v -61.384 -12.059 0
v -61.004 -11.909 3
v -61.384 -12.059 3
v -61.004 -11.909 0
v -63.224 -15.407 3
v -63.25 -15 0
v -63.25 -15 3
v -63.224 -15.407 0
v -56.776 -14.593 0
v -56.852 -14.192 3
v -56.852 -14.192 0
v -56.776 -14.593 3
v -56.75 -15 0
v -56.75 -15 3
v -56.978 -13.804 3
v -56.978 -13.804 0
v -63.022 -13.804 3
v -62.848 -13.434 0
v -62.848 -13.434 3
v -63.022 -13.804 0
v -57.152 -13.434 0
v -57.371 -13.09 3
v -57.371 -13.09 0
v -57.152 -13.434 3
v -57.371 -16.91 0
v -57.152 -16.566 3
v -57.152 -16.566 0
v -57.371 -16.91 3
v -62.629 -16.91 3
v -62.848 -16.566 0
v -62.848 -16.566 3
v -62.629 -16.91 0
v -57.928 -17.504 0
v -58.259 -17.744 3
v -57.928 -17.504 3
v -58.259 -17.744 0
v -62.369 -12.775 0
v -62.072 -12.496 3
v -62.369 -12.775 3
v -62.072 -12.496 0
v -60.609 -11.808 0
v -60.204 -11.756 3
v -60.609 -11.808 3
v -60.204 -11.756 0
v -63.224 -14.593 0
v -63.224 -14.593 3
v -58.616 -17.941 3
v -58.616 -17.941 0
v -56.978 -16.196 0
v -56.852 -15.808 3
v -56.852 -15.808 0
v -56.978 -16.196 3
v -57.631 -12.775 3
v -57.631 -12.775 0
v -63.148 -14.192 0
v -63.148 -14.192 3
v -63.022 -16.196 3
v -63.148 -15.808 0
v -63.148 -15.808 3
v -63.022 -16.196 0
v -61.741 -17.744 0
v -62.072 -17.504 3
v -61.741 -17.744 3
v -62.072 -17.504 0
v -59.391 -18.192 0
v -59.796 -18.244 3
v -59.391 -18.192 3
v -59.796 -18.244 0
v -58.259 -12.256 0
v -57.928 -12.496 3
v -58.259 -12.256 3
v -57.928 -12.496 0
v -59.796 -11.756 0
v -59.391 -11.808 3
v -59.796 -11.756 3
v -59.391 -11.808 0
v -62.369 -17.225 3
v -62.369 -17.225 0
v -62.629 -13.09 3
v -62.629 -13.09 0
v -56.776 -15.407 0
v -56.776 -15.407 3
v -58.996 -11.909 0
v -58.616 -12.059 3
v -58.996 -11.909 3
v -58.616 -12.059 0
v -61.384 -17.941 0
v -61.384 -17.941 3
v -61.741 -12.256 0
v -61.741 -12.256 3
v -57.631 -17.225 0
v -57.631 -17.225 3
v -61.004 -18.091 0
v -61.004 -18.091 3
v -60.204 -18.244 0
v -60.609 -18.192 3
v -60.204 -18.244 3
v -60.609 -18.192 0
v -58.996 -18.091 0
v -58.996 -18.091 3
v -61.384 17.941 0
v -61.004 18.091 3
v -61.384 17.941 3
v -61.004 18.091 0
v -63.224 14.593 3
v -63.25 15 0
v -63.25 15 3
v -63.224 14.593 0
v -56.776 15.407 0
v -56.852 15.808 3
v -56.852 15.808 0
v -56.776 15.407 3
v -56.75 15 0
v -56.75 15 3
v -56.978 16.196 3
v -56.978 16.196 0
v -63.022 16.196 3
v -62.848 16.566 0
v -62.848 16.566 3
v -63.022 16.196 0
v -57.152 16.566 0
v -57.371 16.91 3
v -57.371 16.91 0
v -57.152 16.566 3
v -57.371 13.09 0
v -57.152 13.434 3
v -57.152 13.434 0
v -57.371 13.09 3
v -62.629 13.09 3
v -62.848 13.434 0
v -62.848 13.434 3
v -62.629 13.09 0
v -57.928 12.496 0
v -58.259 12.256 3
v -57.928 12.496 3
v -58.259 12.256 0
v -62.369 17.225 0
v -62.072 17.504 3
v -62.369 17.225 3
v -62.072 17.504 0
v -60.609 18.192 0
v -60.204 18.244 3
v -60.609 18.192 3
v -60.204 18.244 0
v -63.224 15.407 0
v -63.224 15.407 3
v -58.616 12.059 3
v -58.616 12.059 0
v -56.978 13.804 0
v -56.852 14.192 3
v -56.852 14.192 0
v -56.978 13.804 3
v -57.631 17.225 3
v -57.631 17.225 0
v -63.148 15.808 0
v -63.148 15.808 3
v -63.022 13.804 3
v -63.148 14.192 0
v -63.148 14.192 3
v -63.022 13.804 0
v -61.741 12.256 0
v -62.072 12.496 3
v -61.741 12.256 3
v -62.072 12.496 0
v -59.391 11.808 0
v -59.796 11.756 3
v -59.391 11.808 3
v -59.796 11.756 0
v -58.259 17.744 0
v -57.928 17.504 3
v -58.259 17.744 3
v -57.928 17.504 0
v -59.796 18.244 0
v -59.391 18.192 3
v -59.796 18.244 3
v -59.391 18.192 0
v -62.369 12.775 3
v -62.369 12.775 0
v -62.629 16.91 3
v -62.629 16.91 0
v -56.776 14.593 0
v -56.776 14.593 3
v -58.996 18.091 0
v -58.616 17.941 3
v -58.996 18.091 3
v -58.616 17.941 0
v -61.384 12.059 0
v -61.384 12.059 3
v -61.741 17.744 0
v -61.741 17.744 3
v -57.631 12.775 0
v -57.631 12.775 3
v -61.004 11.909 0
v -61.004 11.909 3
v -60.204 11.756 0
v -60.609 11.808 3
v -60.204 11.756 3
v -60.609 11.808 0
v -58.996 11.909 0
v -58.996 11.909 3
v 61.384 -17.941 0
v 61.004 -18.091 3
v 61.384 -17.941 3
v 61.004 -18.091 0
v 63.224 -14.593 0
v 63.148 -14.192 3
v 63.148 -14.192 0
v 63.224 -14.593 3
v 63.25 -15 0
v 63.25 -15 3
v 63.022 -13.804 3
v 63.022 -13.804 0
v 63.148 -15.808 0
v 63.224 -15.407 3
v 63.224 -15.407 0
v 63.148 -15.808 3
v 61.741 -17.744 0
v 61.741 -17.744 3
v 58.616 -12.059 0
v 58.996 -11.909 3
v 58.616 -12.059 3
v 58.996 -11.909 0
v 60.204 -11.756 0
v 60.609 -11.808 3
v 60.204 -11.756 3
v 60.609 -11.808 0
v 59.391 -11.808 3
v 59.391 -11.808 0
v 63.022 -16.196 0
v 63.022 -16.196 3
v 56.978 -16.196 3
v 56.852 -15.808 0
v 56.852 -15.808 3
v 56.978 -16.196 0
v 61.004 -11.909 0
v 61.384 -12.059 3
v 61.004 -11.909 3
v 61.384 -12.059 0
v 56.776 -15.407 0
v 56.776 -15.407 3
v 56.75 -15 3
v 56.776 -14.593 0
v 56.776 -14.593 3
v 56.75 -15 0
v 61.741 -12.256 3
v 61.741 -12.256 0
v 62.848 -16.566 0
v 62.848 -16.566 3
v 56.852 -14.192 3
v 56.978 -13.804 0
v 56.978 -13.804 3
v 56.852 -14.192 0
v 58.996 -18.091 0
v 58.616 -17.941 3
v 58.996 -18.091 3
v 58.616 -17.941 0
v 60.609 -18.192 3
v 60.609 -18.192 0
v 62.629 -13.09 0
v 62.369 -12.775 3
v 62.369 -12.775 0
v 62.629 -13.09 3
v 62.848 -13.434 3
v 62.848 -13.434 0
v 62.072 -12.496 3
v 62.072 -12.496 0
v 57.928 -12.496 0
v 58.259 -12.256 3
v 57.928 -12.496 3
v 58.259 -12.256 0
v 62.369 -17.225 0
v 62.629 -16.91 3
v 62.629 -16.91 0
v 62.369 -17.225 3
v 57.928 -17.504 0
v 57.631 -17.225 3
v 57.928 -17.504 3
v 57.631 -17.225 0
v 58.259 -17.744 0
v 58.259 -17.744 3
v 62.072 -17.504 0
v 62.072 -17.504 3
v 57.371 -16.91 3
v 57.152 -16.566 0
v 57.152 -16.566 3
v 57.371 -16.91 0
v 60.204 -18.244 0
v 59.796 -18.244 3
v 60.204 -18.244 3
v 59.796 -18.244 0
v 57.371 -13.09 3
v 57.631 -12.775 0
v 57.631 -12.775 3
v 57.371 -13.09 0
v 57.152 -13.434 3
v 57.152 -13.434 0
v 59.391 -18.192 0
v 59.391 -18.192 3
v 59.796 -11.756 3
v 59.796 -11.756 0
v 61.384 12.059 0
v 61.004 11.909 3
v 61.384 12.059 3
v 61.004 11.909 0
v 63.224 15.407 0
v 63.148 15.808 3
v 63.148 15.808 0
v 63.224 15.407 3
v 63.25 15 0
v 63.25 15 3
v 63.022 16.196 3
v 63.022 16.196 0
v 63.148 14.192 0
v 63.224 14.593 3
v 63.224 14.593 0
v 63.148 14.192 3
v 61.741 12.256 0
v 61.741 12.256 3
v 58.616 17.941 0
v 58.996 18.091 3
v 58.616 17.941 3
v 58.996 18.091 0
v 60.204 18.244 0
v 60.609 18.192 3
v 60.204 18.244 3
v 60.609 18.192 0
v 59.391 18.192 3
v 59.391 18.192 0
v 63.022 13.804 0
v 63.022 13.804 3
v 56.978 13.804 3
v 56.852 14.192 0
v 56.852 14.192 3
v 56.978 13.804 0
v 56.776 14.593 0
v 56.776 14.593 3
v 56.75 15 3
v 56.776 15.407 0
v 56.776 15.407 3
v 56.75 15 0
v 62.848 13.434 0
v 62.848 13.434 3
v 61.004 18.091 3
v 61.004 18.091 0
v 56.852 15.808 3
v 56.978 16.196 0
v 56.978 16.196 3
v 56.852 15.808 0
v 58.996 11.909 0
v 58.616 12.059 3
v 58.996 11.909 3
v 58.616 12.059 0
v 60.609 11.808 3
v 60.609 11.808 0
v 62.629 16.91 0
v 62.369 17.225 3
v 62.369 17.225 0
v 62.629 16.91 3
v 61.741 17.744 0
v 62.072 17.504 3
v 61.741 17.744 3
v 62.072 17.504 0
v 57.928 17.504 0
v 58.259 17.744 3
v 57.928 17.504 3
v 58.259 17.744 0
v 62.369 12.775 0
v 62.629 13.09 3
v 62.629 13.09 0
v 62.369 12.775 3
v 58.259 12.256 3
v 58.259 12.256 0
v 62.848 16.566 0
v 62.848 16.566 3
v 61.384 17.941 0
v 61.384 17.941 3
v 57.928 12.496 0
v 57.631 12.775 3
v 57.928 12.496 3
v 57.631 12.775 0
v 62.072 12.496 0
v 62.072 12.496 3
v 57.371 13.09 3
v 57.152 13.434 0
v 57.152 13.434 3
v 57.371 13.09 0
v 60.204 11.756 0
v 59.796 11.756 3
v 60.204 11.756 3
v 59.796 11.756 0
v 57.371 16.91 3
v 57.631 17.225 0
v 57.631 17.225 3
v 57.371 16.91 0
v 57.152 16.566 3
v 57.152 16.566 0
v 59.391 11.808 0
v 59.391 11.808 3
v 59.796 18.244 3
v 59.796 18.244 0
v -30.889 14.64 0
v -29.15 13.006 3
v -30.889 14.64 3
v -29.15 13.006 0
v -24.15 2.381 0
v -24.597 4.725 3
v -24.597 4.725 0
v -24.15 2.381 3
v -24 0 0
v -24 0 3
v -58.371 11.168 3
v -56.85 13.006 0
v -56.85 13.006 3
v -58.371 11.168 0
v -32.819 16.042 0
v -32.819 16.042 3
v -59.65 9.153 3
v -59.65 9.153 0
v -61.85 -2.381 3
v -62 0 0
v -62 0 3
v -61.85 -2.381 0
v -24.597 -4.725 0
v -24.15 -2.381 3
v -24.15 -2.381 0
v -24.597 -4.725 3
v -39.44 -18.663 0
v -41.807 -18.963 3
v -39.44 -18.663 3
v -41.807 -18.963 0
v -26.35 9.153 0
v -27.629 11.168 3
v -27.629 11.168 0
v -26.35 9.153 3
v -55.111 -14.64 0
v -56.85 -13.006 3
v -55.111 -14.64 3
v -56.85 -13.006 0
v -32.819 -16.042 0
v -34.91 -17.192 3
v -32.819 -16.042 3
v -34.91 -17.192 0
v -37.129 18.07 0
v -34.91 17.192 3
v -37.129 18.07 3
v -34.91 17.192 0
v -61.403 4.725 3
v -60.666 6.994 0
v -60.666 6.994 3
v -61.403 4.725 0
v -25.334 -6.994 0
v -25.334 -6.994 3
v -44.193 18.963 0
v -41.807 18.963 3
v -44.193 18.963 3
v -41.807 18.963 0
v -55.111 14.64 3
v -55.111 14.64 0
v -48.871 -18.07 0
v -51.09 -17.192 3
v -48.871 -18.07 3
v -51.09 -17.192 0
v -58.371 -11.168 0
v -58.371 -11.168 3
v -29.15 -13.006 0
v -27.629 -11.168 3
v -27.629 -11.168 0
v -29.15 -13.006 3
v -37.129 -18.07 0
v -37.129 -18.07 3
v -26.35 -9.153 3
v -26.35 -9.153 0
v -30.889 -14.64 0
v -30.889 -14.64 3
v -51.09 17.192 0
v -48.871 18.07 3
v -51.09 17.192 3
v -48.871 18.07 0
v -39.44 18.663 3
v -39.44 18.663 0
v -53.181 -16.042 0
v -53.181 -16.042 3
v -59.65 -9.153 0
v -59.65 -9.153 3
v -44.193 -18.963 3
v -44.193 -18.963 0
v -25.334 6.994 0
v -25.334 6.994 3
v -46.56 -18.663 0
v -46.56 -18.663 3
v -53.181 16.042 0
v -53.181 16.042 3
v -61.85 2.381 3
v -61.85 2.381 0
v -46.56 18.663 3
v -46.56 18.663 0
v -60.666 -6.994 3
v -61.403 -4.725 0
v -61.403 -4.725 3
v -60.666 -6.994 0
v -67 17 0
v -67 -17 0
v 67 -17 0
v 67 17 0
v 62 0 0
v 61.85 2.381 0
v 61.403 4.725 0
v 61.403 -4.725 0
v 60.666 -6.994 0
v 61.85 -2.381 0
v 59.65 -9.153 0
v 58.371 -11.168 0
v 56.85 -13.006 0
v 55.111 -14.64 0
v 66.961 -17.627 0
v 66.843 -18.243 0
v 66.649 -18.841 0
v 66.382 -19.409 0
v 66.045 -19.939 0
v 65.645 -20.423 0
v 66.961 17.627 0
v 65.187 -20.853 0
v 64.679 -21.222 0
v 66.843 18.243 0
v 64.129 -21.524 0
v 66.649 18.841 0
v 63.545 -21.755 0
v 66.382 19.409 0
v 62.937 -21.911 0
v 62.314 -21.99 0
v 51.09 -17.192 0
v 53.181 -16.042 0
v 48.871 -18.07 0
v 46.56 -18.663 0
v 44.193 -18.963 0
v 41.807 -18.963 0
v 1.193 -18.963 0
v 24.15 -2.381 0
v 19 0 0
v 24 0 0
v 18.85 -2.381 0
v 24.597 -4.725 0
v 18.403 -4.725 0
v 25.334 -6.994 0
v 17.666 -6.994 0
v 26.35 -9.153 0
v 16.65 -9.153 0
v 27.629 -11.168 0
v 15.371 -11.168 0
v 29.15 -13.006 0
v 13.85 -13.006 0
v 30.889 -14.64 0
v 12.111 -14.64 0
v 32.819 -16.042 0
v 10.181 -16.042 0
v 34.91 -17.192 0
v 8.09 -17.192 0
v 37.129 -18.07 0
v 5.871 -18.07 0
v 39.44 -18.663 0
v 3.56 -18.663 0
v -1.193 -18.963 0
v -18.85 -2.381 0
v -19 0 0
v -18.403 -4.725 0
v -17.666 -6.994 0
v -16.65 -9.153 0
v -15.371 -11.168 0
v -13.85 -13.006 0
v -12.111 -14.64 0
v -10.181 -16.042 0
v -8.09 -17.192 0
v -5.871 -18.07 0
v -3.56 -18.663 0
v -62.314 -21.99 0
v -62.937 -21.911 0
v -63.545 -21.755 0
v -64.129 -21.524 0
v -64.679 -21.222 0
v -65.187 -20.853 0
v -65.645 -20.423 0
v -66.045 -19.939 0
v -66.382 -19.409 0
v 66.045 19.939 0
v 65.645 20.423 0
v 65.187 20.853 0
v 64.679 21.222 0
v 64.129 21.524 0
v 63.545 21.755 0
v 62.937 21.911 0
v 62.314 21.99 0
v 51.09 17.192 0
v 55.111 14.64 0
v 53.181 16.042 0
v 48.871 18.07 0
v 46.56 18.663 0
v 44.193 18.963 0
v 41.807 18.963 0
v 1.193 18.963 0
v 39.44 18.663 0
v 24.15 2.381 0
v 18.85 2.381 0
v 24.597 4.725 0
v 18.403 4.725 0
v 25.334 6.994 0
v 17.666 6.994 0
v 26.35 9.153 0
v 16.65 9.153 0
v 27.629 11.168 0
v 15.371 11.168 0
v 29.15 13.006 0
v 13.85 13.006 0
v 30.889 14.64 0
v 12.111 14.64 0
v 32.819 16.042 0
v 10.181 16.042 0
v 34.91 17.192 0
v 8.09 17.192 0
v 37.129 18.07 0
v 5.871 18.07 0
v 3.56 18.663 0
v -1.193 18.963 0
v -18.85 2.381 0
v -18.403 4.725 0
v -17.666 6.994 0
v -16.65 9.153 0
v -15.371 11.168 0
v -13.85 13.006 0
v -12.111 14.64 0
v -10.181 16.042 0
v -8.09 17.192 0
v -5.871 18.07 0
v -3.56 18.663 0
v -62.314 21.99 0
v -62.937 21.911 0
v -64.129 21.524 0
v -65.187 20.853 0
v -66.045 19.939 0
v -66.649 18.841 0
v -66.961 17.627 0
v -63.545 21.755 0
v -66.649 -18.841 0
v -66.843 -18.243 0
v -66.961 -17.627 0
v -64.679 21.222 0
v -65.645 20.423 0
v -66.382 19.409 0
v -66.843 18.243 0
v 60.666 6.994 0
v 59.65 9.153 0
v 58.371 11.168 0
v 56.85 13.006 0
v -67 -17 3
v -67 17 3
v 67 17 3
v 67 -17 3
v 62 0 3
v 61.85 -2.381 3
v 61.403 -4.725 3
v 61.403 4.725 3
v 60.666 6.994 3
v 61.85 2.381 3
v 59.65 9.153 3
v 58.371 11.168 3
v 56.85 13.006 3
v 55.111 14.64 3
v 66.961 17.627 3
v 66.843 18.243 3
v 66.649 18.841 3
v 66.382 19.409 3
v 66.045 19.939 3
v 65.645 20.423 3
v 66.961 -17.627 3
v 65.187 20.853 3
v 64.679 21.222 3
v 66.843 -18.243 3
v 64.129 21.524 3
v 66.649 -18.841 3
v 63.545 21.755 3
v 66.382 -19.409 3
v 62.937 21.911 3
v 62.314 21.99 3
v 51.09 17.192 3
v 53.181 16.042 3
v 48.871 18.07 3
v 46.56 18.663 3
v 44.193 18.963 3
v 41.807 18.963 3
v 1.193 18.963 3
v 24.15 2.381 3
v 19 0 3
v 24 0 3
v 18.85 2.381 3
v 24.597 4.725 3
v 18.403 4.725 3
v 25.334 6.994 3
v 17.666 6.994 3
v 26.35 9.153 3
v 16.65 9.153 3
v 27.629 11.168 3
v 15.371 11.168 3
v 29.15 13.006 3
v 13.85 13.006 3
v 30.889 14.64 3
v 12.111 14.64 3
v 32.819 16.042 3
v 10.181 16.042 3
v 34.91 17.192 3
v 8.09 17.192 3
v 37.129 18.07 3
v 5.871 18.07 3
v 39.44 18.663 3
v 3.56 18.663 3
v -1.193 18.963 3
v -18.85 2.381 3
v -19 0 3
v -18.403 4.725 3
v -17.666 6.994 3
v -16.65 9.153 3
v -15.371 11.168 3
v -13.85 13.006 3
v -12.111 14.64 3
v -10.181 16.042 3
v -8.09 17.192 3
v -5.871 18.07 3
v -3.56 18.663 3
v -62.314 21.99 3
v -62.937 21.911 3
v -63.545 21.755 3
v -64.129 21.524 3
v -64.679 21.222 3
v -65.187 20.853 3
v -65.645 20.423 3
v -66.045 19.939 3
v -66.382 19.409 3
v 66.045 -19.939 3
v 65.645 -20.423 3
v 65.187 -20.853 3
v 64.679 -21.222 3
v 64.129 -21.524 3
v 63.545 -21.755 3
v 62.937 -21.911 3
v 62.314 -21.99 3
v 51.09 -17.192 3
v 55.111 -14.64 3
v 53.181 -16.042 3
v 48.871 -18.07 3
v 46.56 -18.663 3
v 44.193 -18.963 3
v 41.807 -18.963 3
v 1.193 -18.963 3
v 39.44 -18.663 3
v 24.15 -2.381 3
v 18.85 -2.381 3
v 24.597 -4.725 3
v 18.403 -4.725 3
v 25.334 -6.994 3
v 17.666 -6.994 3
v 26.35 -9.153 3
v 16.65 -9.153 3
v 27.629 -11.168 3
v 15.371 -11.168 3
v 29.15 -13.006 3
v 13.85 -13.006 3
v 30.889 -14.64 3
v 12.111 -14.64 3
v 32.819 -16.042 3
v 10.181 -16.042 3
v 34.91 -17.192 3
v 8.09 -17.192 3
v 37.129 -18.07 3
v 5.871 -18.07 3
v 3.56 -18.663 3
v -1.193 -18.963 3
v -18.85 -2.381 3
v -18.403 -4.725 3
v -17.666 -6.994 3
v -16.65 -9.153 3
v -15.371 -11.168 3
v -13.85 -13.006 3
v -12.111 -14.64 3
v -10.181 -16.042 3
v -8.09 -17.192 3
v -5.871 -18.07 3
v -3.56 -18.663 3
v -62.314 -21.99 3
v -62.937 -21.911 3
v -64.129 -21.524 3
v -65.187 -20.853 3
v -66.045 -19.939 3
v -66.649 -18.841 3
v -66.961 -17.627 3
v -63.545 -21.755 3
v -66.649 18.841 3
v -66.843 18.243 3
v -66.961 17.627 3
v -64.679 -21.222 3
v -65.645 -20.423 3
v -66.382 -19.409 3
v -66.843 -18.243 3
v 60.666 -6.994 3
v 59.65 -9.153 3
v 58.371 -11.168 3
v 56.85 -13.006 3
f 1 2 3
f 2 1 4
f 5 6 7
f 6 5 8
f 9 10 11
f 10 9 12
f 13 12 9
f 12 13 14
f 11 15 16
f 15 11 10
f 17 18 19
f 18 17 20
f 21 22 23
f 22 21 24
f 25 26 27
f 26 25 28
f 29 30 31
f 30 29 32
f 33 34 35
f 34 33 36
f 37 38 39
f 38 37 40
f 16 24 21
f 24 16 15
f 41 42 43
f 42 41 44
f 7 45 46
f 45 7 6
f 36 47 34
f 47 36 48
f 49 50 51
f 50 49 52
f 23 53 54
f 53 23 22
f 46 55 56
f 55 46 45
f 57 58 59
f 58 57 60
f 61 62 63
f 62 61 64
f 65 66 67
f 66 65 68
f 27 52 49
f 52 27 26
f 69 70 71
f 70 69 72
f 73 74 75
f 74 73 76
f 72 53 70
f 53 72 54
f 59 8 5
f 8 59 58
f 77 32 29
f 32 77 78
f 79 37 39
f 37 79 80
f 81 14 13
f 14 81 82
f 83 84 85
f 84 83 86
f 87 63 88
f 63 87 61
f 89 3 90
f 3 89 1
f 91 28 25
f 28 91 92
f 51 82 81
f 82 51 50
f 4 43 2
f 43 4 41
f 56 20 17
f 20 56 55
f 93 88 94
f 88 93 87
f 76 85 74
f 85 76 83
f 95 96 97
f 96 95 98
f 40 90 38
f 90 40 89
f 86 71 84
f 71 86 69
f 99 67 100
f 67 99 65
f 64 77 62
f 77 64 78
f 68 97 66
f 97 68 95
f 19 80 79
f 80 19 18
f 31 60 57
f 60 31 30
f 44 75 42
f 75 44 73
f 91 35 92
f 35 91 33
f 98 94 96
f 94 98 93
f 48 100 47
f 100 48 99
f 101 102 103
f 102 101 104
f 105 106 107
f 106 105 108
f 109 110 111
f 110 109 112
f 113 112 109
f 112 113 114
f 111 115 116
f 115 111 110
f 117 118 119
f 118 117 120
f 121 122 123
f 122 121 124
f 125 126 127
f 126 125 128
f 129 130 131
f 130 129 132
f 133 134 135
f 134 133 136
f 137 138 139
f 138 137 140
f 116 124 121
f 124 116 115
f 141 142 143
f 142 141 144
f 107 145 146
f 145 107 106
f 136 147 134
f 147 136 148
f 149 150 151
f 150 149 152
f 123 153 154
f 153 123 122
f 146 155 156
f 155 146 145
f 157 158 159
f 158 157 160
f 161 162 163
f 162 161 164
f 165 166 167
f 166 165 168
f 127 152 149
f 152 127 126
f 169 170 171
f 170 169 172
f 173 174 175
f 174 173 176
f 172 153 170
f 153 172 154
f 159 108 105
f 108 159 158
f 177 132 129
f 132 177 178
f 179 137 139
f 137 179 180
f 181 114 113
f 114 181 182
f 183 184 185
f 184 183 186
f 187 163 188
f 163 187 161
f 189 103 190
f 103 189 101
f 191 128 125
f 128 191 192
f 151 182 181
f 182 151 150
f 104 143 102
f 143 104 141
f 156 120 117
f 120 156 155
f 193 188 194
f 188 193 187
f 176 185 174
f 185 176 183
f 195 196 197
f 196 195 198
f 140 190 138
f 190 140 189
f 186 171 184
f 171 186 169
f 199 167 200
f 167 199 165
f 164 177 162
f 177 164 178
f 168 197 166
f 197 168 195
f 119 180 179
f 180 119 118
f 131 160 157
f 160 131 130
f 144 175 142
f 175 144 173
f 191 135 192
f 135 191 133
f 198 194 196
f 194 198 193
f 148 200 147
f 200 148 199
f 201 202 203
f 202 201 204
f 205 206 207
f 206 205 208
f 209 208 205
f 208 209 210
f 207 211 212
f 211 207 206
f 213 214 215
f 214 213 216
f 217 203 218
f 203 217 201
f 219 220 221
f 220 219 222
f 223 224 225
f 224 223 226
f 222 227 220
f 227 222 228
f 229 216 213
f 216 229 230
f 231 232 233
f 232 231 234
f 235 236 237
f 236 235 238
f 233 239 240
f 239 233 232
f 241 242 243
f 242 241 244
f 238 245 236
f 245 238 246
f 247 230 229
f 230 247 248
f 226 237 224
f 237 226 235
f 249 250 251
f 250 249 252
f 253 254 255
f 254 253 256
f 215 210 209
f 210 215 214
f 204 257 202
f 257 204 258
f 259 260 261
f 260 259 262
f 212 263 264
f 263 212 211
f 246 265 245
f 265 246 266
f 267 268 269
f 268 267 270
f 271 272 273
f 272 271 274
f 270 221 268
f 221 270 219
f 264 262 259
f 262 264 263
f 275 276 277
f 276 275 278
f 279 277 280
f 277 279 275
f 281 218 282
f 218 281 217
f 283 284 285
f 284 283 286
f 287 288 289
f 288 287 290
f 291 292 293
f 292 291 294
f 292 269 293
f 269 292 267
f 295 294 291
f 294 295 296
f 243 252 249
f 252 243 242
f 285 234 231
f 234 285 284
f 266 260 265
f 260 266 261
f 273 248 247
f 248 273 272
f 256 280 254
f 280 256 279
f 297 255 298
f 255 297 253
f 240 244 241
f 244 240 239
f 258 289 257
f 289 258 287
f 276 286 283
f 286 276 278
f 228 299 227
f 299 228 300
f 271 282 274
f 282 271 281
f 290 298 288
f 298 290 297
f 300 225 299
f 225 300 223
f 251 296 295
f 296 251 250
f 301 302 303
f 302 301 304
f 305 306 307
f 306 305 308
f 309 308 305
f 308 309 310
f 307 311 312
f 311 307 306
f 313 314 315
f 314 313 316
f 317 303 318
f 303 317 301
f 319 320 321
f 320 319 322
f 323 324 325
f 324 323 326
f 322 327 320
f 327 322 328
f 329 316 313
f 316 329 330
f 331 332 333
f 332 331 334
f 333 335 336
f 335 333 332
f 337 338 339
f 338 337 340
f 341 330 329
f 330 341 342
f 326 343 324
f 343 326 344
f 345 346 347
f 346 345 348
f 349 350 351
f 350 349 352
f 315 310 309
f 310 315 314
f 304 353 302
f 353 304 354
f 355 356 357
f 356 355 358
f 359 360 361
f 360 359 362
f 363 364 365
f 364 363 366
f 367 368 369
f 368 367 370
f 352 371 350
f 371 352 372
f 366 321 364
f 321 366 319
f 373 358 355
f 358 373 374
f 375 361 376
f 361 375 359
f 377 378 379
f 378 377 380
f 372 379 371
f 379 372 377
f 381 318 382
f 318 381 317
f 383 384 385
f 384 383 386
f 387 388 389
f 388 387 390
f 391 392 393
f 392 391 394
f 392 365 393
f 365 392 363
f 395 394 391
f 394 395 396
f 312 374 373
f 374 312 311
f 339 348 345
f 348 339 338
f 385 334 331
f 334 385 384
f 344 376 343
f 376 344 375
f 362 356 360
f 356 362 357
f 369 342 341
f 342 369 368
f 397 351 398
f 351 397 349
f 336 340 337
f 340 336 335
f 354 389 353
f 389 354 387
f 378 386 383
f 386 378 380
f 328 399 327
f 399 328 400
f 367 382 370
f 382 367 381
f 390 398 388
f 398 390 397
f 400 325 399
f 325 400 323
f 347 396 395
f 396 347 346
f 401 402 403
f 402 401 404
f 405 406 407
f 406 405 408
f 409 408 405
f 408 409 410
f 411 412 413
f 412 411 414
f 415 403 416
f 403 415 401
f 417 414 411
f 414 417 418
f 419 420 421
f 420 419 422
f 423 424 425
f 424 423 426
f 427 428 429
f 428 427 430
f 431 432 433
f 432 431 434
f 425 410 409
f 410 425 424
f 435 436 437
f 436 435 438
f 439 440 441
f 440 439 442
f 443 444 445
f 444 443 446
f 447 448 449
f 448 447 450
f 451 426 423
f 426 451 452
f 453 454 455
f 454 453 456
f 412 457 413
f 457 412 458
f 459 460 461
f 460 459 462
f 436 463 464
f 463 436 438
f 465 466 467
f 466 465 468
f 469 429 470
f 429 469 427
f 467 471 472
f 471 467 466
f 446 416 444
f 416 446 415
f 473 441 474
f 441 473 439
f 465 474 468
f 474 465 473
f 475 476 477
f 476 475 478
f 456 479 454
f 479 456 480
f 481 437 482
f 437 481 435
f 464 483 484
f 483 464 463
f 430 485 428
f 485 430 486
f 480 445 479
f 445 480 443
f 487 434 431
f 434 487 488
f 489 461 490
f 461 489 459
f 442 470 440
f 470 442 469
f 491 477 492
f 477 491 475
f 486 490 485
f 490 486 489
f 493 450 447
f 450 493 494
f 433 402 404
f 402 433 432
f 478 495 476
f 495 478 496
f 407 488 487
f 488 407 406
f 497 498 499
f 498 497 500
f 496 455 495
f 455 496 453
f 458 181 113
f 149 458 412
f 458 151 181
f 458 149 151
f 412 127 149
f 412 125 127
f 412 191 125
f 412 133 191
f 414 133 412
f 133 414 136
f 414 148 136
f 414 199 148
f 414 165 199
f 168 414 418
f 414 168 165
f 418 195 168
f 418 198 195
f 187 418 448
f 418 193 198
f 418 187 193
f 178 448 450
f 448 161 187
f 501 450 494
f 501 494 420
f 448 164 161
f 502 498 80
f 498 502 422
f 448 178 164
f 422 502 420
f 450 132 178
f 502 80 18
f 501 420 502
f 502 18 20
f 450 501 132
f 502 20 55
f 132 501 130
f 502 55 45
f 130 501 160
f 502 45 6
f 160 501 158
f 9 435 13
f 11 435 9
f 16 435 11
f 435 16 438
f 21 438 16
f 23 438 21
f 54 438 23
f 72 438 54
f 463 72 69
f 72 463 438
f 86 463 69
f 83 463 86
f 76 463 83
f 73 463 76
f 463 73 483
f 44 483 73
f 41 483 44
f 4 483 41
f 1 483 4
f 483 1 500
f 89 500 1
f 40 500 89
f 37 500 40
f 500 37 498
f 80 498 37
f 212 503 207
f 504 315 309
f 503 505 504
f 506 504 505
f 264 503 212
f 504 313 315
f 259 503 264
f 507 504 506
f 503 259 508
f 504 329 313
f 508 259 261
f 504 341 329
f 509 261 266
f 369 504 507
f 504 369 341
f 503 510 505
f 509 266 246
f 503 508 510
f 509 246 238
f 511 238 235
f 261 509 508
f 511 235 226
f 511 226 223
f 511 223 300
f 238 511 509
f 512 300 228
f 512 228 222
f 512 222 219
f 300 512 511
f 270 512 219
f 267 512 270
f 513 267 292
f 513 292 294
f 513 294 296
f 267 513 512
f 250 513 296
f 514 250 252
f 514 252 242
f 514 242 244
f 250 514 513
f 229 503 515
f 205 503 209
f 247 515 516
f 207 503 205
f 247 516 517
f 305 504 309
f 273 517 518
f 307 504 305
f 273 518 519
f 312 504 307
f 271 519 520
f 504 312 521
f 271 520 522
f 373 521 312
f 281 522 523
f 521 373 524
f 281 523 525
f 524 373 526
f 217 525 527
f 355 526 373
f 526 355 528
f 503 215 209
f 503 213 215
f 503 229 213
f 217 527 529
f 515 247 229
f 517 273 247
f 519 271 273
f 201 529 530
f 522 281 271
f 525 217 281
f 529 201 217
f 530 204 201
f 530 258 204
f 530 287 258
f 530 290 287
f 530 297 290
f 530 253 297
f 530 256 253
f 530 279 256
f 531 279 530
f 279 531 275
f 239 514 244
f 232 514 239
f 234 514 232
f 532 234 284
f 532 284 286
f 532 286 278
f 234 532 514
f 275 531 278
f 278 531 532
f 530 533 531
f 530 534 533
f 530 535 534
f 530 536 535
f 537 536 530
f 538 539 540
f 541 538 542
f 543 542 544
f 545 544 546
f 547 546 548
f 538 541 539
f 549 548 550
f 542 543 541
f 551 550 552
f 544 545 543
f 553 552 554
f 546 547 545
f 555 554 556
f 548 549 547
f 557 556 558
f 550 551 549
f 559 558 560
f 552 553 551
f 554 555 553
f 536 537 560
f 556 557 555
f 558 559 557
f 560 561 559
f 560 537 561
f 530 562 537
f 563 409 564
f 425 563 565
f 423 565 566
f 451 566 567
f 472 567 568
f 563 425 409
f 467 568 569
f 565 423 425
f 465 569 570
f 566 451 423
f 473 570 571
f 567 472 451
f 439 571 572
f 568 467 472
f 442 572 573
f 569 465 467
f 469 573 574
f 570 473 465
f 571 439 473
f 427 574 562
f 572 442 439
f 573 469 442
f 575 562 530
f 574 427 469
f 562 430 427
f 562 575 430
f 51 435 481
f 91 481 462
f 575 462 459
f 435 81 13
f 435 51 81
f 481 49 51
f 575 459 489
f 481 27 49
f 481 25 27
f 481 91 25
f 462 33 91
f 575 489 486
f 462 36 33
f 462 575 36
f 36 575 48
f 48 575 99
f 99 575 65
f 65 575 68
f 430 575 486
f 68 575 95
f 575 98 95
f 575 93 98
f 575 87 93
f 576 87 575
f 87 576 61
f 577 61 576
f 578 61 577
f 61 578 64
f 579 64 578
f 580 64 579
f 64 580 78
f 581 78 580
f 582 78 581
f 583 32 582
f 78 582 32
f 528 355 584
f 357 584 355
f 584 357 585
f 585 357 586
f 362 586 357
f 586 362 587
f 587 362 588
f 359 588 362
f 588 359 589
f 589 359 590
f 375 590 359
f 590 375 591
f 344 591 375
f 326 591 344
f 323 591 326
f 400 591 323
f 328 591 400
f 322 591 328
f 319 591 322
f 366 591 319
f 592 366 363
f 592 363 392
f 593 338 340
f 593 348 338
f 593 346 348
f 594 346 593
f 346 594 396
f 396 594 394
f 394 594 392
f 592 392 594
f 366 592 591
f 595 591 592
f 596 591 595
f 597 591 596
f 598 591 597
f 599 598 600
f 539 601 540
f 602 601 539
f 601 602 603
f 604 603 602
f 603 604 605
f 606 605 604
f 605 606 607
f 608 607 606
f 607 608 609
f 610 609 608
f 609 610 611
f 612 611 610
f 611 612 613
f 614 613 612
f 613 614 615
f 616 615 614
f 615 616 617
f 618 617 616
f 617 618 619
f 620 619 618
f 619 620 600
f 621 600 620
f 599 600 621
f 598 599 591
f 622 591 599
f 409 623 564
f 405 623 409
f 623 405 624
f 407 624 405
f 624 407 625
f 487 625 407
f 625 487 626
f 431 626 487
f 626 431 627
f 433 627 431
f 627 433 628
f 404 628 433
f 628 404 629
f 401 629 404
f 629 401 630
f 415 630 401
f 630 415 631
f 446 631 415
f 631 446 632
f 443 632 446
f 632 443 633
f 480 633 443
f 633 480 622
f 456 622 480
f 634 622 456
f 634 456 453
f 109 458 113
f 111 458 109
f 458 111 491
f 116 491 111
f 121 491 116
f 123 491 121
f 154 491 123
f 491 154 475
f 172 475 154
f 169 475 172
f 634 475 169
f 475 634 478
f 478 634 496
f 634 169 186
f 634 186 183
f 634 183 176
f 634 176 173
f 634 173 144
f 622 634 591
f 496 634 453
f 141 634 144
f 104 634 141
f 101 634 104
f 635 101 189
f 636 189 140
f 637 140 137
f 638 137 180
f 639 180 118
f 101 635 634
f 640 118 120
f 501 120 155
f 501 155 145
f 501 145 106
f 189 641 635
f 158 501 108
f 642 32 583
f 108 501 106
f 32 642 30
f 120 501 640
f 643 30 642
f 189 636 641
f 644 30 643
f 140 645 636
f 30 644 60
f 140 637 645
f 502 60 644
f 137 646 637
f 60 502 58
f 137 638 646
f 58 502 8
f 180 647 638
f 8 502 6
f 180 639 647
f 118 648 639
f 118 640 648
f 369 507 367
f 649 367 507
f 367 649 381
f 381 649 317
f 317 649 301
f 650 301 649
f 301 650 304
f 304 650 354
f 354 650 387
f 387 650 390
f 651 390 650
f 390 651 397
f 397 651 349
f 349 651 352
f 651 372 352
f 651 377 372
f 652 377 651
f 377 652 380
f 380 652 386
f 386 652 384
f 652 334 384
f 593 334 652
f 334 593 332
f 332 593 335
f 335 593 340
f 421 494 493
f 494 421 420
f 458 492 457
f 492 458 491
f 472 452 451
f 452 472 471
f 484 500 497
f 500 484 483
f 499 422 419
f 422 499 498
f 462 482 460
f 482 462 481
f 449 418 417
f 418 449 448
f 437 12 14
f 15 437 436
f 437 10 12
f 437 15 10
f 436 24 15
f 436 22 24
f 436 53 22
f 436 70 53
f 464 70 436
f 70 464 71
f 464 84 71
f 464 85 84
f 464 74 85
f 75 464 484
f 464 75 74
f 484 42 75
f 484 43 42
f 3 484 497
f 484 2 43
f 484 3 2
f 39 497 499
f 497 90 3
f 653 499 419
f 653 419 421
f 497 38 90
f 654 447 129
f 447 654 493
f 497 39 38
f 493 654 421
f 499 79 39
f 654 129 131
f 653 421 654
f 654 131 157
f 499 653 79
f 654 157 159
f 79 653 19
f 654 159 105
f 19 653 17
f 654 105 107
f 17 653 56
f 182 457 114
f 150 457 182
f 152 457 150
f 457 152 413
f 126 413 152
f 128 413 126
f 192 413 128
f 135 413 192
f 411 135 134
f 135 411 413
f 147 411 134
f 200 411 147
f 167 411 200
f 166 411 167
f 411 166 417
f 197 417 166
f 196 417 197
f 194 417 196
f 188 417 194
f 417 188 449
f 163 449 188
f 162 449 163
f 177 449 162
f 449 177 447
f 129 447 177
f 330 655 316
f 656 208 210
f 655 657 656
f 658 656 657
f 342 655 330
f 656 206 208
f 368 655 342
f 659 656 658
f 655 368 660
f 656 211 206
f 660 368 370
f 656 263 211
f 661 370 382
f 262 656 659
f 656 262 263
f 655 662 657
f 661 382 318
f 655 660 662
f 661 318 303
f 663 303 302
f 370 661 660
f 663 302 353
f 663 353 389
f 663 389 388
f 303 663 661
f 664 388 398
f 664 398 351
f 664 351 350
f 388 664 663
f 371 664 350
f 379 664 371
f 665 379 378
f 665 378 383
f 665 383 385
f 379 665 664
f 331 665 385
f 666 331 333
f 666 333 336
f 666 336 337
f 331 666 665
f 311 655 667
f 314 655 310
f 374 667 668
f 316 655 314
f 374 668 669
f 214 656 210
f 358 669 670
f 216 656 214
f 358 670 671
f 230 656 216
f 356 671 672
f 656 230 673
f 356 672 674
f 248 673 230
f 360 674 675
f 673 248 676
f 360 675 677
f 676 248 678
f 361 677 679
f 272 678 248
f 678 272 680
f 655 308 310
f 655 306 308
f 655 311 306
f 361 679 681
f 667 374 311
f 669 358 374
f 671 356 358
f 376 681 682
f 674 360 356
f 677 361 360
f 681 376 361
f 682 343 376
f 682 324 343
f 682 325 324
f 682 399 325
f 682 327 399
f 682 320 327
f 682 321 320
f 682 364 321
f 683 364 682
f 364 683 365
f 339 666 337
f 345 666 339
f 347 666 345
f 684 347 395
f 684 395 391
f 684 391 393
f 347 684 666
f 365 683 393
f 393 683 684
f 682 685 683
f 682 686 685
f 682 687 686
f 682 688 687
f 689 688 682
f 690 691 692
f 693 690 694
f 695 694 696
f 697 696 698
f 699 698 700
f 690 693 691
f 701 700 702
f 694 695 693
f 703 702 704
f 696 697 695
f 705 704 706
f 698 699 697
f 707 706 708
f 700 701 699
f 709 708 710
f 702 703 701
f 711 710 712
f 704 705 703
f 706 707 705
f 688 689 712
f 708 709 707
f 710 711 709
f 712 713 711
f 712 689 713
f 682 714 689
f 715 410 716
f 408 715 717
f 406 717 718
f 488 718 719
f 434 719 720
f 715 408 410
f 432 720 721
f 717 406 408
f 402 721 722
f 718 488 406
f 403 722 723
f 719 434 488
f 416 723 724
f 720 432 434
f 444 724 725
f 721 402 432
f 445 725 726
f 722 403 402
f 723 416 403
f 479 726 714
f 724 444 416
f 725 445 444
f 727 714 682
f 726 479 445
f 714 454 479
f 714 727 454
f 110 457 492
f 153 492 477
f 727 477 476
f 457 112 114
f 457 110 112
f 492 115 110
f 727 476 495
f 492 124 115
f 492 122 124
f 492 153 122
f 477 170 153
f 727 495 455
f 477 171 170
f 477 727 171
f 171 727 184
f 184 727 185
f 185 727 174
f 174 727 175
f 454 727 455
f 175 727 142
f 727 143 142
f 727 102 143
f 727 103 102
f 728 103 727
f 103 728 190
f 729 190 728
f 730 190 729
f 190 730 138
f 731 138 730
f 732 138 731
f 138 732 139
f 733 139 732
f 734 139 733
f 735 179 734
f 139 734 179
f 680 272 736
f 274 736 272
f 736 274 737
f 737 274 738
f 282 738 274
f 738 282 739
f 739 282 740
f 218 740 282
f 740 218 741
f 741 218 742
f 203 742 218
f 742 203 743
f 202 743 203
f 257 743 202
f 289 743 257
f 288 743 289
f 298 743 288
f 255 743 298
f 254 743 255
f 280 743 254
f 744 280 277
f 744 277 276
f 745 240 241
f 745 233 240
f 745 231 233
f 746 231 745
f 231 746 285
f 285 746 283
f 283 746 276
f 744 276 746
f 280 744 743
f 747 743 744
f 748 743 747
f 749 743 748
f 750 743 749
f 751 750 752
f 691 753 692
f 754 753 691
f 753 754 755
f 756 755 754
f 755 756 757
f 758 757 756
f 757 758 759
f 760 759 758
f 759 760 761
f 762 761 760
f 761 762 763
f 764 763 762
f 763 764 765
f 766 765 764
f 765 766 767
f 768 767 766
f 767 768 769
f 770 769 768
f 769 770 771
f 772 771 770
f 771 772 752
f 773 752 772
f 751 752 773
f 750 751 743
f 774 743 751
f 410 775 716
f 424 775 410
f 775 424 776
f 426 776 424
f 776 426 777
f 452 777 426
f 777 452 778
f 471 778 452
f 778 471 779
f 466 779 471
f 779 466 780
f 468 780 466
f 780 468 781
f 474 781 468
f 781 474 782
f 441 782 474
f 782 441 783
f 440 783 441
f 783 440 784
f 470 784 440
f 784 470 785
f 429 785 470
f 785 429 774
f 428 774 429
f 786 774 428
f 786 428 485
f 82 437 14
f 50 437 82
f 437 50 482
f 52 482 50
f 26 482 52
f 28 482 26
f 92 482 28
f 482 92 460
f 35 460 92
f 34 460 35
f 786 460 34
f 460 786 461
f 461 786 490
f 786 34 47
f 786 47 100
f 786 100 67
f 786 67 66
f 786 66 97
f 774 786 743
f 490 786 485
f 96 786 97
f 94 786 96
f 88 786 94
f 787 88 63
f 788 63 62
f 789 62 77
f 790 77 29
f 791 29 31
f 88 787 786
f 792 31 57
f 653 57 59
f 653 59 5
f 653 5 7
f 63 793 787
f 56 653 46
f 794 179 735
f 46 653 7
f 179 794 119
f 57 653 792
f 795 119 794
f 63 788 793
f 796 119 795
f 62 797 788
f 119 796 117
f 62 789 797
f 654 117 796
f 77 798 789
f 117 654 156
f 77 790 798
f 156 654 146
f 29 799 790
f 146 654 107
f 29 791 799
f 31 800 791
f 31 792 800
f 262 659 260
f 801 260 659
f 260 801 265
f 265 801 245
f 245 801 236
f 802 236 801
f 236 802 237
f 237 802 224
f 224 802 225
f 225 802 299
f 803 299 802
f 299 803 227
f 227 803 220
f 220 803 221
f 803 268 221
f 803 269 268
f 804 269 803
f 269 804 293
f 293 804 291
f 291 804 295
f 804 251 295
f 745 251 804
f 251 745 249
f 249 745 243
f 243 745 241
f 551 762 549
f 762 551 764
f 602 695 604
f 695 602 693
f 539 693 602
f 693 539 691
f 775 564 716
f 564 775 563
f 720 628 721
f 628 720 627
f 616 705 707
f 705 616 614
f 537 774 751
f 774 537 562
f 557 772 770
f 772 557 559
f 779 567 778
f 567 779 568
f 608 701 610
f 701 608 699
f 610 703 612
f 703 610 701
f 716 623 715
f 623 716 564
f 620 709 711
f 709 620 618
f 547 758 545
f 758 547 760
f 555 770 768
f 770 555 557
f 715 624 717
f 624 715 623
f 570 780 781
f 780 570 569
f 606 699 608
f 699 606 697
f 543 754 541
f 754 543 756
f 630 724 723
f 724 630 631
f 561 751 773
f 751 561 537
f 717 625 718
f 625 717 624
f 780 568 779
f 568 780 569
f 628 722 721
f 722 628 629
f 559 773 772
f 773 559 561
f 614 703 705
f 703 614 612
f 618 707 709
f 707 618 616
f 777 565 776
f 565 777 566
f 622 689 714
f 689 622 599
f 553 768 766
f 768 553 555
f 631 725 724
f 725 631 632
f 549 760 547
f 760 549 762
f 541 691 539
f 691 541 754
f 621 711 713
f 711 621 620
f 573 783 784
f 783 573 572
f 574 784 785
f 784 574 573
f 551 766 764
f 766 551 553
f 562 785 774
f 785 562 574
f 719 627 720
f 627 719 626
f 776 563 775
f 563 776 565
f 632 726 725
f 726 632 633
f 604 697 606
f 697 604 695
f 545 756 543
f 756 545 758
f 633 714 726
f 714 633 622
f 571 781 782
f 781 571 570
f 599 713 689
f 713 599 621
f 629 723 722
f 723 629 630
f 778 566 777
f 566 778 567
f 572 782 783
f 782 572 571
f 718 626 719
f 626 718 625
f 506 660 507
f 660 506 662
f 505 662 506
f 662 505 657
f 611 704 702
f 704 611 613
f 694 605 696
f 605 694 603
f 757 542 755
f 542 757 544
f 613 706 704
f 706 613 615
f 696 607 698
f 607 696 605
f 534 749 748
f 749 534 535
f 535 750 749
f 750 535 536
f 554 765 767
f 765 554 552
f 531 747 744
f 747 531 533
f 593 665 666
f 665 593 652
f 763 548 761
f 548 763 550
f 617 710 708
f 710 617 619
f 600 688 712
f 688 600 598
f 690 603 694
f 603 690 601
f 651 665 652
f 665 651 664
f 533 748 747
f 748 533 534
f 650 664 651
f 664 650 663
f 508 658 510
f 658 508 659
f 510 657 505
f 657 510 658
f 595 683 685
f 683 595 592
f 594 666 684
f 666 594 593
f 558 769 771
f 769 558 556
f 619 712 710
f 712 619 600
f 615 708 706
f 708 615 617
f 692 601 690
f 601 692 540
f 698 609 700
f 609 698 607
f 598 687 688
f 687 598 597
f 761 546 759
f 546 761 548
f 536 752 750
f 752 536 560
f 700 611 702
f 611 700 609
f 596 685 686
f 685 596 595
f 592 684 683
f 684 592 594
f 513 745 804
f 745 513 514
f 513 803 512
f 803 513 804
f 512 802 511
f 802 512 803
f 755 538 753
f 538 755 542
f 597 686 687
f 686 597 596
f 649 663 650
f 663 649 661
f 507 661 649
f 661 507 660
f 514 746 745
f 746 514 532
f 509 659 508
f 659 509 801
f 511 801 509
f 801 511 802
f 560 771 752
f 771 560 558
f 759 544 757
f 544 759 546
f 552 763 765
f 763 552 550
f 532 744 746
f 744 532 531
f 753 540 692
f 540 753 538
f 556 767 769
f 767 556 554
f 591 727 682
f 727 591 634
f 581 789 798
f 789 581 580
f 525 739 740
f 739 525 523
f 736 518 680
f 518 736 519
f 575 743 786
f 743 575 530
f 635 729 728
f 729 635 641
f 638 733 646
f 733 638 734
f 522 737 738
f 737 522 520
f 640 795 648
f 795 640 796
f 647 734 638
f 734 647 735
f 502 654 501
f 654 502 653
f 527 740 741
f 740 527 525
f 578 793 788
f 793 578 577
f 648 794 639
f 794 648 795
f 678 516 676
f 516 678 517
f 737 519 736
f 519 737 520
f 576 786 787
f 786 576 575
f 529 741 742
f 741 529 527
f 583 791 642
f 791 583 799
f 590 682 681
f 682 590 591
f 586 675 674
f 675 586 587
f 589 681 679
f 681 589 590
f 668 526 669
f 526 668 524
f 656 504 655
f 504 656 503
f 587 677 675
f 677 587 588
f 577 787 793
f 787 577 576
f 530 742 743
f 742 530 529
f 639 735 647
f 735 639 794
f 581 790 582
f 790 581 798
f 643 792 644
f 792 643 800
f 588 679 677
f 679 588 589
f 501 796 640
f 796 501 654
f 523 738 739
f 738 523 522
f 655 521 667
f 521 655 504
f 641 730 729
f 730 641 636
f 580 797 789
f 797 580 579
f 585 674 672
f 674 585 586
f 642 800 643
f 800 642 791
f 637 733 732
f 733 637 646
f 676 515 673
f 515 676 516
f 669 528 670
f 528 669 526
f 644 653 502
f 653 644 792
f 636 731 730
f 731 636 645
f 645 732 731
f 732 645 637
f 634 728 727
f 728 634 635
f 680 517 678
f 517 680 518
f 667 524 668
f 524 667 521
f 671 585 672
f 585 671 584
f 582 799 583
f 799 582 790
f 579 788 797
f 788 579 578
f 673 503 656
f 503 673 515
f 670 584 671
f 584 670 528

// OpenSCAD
$fn = 50;

difference() {
	union() {
		hull() {
			translate(v = [-62.0, 17.0, 0]) {
				cylinder(h = 3, r = 5);
			}
			translate(v = [62.0, 17.0, 0]) {
				cylinder(h = 3, r = 5);
			}
			translate(v = [-62.0, -17.0, 0]) {
				cylinder(h = 3, r = 5);
			}
			translate(v = [62.0, -17.0, 0]) {
				cylinder(h = 3, r = 5);
			}
		}
	}
	union() {
		translate(v = [-60.0, -15.0, -100.0]) {
			cylinder(h = 200, r = 3.25);
		}
		translate(v = [-60.0, 15.0, -100.0]) {
			cylinder(h = 200, r = 3.25);
		}
		translate(v = [60.0, -15.0, -100.0]) {
			cylinder(h = 200, r = 3.25);
		}
		translate(v = [60.0, 15.0, -100.0]) {
			cylinder(h = 200, r = 3.25);
		}
		translate(v = [-60.0, -15.0, -100.0]) {
			cylinder(h = 200, r = 1.8);
		}
		translate(v = [-60.0, 15.0, -100.0]) {
			cylinder(h = 200, r = 1.8);
		}
		translate(v = [60.0, -15.0, -100.0]) {
			cylinder(h = 200, r = 1.8);
		}
		translate(v = [60.0, 15.0, -100.0]) {
			cylinder(h = 200, r = 1.8);
		}
		translate(v = [-43.0, 0, 0.0]) {
			cylinder(h = 3, r = 19.0);
		}
		cylinder(h = 3, r = 19.0);
		translate(v = [43.0, 0, 0.0]) {
			cylinder(h = 3, r = 19.0);
		}
	}
}
